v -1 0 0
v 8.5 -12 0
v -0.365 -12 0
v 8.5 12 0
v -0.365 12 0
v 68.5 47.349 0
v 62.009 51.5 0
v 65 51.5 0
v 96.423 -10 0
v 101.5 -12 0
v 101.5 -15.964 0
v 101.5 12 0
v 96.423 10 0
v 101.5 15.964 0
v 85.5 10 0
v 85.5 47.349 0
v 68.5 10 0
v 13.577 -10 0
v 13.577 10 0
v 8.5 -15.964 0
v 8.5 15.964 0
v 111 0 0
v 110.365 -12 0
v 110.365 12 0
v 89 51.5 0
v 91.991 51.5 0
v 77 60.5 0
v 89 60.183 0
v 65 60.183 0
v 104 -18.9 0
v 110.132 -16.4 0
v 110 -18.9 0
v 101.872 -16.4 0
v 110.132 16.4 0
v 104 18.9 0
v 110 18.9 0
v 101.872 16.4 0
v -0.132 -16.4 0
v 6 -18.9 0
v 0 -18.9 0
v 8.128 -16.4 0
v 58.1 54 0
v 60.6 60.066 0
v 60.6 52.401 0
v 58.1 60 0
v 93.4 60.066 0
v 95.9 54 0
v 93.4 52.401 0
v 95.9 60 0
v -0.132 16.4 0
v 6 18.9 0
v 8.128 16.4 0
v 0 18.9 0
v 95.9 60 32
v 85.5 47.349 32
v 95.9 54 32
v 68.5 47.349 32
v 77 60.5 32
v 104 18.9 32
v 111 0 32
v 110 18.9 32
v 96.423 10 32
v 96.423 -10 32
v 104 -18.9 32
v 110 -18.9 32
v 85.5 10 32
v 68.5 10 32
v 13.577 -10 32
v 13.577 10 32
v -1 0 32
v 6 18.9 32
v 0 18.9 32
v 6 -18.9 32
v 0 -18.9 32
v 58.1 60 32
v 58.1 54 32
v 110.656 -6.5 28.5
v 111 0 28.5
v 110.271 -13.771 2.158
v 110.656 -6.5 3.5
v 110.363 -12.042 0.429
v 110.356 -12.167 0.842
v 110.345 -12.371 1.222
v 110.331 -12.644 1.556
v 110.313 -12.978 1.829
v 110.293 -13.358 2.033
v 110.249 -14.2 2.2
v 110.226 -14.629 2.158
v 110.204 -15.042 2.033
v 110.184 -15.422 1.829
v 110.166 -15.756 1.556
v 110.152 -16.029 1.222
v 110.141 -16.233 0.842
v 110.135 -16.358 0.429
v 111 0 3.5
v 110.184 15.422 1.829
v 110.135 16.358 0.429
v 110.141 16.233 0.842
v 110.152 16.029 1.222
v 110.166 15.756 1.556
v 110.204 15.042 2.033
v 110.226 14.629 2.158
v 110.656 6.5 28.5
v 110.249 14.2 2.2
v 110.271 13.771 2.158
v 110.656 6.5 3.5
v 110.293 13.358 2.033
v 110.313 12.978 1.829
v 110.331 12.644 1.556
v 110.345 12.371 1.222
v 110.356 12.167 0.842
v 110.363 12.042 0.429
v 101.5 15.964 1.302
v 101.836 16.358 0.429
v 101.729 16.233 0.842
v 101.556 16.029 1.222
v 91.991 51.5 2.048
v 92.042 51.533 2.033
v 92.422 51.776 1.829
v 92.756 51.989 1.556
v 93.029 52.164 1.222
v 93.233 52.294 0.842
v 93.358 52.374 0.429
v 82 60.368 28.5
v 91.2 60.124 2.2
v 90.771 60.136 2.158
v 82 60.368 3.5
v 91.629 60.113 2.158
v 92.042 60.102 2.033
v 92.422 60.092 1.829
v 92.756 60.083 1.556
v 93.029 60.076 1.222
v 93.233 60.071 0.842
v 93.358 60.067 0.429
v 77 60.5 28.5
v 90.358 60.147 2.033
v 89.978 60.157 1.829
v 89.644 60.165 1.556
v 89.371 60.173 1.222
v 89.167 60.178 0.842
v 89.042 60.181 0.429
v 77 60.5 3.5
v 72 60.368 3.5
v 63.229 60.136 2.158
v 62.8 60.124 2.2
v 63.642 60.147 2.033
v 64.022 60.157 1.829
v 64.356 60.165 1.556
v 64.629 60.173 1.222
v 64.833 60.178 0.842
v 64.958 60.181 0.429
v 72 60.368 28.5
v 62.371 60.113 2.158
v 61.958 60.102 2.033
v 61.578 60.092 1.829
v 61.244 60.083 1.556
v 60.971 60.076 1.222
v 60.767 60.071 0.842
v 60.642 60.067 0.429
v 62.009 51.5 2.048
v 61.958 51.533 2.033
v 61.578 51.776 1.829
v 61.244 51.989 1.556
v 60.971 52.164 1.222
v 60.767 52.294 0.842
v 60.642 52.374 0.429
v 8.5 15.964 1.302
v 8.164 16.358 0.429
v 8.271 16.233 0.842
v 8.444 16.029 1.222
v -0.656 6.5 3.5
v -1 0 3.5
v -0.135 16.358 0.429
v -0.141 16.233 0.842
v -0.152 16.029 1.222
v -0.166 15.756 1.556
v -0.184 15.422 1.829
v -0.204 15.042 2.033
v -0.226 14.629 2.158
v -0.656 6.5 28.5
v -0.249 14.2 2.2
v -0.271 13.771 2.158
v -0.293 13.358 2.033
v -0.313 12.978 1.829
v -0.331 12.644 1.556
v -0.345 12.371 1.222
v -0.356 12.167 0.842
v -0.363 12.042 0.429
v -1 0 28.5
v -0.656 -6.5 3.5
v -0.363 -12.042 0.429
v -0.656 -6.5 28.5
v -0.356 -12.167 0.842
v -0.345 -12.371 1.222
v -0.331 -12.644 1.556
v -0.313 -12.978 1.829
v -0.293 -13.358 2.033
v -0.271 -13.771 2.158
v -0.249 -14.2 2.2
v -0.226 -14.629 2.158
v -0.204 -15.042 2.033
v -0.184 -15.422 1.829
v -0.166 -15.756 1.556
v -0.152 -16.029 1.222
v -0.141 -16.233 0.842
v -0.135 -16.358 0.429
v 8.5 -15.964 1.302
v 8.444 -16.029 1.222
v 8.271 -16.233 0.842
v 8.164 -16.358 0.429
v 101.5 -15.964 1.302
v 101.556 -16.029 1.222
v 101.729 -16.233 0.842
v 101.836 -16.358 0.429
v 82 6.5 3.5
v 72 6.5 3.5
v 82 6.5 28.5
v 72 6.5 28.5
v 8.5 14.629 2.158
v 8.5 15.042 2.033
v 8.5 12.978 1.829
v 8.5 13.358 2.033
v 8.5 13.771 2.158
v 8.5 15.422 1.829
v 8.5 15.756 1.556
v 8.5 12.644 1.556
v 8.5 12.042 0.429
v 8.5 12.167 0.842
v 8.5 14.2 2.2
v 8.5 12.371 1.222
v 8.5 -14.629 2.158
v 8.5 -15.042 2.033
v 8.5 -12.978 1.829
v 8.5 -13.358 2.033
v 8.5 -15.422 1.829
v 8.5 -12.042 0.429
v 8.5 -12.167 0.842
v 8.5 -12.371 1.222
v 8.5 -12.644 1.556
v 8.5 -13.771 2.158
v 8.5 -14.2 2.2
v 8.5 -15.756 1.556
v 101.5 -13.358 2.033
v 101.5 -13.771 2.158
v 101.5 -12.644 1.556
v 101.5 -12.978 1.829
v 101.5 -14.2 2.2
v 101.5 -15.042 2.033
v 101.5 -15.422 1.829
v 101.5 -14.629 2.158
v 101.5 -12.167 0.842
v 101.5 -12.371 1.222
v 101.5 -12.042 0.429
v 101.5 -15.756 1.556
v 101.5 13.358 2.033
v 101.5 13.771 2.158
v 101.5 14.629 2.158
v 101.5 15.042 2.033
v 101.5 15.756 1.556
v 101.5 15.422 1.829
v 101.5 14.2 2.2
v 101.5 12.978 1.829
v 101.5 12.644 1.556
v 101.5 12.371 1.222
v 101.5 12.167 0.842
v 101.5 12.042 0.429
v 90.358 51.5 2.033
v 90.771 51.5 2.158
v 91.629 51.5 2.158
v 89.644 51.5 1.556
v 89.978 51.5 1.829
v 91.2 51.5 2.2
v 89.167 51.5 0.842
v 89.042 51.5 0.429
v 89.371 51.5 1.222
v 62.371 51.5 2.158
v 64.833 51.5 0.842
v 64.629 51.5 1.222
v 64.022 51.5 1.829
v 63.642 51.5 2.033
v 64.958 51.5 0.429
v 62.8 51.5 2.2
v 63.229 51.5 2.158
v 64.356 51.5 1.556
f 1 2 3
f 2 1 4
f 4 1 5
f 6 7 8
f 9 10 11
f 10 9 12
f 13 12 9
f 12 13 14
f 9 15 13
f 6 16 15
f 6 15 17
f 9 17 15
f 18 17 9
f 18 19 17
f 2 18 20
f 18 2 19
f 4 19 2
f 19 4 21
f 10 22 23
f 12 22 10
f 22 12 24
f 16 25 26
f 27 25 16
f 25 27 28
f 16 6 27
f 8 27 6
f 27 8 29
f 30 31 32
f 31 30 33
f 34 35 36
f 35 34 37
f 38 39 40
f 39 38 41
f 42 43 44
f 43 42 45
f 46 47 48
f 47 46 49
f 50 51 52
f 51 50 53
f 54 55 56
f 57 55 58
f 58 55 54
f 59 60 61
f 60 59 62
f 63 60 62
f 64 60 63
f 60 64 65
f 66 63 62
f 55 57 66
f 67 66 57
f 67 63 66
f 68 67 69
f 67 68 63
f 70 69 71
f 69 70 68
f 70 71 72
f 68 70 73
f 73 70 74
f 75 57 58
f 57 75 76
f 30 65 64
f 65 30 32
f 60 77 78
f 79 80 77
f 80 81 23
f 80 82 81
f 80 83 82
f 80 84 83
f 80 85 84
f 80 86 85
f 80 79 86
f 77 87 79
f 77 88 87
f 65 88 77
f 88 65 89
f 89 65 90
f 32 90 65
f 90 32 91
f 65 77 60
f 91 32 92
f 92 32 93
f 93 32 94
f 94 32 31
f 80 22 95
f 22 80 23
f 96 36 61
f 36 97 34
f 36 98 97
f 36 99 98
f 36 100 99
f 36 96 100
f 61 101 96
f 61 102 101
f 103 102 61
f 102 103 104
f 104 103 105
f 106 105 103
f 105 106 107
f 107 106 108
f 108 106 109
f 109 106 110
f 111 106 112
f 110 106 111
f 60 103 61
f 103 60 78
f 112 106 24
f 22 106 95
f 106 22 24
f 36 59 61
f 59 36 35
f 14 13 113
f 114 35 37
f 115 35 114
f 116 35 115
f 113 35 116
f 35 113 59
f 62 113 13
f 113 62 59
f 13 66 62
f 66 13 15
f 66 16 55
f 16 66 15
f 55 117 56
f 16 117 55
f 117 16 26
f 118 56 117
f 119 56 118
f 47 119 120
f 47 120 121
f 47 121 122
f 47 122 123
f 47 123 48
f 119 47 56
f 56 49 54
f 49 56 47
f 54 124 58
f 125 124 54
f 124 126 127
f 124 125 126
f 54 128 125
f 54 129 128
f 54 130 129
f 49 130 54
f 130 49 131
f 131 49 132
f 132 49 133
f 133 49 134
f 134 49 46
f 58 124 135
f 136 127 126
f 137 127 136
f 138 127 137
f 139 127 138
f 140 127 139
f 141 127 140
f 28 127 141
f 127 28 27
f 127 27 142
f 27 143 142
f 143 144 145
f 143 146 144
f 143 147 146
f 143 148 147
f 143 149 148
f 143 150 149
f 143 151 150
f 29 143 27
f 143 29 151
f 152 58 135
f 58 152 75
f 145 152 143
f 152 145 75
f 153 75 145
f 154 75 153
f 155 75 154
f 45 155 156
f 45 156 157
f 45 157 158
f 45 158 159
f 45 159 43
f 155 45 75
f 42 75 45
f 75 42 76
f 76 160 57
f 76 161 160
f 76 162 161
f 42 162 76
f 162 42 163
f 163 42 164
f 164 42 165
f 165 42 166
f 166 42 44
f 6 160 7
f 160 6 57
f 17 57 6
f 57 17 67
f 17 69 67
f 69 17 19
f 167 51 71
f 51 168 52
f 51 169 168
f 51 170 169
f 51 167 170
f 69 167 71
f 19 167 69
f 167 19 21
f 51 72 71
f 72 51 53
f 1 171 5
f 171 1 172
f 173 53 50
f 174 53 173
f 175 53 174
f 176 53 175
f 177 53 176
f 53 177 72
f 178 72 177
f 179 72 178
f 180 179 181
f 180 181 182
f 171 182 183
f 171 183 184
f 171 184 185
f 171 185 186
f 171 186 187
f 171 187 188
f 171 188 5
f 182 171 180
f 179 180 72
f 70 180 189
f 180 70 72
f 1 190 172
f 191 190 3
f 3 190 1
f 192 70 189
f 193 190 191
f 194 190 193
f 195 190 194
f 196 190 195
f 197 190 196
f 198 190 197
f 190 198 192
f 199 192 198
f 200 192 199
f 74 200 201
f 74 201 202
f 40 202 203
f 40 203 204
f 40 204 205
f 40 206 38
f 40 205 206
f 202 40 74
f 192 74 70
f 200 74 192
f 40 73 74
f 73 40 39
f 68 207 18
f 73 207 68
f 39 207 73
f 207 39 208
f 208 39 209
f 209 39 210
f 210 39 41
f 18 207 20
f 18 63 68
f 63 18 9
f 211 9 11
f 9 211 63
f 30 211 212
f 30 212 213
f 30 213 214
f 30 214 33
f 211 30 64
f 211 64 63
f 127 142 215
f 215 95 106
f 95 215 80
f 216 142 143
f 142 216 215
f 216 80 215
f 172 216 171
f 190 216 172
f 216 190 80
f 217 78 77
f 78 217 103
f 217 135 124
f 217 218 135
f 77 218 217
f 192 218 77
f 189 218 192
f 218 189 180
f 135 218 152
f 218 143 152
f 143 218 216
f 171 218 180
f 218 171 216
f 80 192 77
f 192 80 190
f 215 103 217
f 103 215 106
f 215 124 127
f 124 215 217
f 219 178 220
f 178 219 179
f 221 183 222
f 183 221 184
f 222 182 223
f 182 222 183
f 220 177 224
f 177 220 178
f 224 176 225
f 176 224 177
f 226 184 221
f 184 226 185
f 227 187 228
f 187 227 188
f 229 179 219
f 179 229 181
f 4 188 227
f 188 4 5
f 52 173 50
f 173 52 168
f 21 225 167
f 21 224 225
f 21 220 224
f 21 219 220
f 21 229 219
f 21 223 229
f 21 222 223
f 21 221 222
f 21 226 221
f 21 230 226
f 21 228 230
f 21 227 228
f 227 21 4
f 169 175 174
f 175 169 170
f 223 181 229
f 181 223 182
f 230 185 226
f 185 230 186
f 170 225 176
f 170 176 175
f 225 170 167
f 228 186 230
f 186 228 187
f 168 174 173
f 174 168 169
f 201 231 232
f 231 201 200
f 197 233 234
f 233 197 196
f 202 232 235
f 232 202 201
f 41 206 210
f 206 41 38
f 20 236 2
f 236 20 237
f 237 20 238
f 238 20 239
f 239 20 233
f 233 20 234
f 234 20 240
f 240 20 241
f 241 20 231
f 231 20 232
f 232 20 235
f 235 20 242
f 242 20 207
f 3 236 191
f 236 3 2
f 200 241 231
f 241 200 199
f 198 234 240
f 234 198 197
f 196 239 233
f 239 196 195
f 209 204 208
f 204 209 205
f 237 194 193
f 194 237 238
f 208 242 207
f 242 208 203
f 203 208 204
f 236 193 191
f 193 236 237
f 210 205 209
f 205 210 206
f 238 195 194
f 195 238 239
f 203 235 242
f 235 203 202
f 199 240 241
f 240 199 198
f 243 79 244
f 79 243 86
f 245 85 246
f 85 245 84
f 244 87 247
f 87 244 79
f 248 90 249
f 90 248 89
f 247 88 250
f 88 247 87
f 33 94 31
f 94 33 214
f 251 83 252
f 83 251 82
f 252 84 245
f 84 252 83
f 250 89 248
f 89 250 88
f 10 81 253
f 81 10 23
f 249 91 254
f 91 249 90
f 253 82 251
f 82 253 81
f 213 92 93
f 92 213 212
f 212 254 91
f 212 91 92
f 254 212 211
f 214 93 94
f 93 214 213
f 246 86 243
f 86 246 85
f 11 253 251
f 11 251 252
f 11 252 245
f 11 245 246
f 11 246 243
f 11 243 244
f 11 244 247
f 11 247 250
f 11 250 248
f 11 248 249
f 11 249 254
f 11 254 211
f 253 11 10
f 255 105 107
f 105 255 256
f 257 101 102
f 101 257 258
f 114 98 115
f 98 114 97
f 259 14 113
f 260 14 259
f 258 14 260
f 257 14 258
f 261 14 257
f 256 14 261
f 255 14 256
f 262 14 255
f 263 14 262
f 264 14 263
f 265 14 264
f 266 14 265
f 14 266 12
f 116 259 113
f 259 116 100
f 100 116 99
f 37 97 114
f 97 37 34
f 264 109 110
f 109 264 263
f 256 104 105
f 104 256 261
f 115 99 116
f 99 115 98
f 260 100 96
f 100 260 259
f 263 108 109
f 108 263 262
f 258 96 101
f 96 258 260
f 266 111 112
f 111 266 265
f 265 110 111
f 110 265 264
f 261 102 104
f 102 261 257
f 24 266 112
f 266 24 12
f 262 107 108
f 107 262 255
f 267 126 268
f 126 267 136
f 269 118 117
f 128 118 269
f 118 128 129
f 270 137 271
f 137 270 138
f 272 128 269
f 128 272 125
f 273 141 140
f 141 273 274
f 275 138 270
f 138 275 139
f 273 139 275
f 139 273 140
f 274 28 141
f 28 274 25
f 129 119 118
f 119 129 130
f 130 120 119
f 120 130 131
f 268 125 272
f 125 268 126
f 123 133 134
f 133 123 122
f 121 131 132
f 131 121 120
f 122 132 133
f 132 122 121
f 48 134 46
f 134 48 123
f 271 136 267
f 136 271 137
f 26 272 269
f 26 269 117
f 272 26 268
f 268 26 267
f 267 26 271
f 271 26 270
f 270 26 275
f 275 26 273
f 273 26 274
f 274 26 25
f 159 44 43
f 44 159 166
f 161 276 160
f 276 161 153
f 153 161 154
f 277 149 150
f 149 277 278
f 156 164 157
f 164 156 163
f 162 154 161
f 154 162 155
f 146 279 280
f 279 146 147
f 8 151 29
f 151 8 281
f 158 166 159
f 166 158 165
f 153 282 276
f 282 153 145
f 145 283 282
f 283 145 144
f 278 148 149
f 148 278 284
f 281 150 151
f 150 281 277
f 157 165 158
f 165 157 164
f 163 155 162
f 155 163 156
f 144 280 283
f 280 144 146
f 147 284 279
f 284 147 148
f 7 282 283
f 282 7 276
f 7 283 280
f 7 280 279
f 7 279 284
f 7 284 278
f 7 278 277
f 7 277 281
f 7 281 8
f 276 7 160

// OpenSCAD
$fn = 32;

// ----------------------------------------------------------------------
// Air duct: 20 mm duct, 3.5 mm wall, 32 mm across
// ----------------------------------------------------------------------

// --- parameters (mm) ---
duct_r = 10;              // duct core radius
duct_d = 20;              // duct core diameter
wall = 3.5;               // duct wall thickness
height = 32;              // duct width (extrusion height)
port_r = 18.9;            // port flange half width
port_d = 37.8;            // port flange width
port_t = 6;               // port flange thickness
bolt_d = 4.4;             // port bolt holes
bolt_offset = 14.2;       // bolt hole offset from the port axis
branch_r = 8.5;           // branch core radius
branch_d = 17;            // branch core diameter
branch_len = 60;          // branch length from the run axis

difference() {
  /* outer hull chain: tube with a flat flange plate at every port */
  linear_extrude(height = 32) {
    hull() {
      polygon([[0, -18.9], [0, 18.9], [6, 18.9], [6, -18.9]]);
      translate([9, 0]) circle(r = 10);
    }
    hull() {
      translate([9, 0]) circle(r = 10);
      translate([33, 0]) circle(r = 10);
    }
    hull() {
      translate([33, 0]) circle(r = 10);
      translate([77, 0]) circle(r = 10);
    }
    hull() {
      translate([77, 0]) circle(r = 10);
      translate([101, 0]) circle(r = 10);
    }
    hull() {
      translate([101, 0]) circle(r = 10);
      polygon([[110, 18.9], [110, -18.9], [104, -18.9], [104, 18.9]]);
    }
    hull() {
      translate([77, 0]) circle(r = 8.5);
      translate([77, 33]) circle(r = 8.5);
    }
    hull() {
      translate([77, 33]) circle(r = 8.5);
      translate([77, 52]) circle(r = 8.5);
    }
    hull() {
      translate([77, 52]) circle(r = 8.5);
      polygon([[58.1, 60], [95.9, 60], [95.9, 54], [58.1, 54]]);
    }
  }
  /* air passage: the same chain inset by the wall, 5 mm proud of the ports */
  translate([0, 0, 3.5]) linear_extrude(height = 25) {
    hull() {
      translate([-5, 0]) circle(r = 6.5);
      translate([33, 0]) circle(r = 6.5);
    }
    hull() {
      translate([33, 0]) circle(r = 6.5);
      translate([77, 0]) circle(r = 6.5);
    }
    hull() {
      translate([77, 0]) circle(r = 6.5);
      translate([115, 0]) circle(r = 6.5);
    }
    hull() {
      translate([77, 0]) circle(r = 5);
      translate([77, 33]) circle(r = 5);
    }
    hull() {
      translate([77, 33]) circle(r = 5);
      translate([77, 65]) circle(r = 5);
    }
  }
  translate([0, 0]) rotate([0, 0, -90]) translate([-14.2, -2.5]) rotate([-90, 0, 0]) cylinder(h = 11, d = 4.4);
  translate([0, 0]) rotate([0, 0, -90]) translate([14.2, -2.5]) rotate([-90, 0, 0]) cylinder(h = 11, d = 4.4);
  translate([110, 0]) rotate([0, 0, 90]) translate([-14.2, -2.5]) rotate([-90, 0, 0]) cylinder(h = 11, d = 4.4);
  translate([110, 0]) rotate([0, 0, 90]) translate([14.2, -2.5]) rotate([-90, 0, 0]) cylinder(h = 11, d = 4.4);
  translate([77, 60]) rotate([0, 0, 180]) translate([-14.2, -2.5]) rotate([-90, 0, 0]) cylinder(h = 11, d = 4.4);
  translate([77, 60]) rotate([0, 0, 180]) translate([14.2, -2.5]) rotate([-90, 0, 0]) cylinder(h = 11, d = 4.4);
}
